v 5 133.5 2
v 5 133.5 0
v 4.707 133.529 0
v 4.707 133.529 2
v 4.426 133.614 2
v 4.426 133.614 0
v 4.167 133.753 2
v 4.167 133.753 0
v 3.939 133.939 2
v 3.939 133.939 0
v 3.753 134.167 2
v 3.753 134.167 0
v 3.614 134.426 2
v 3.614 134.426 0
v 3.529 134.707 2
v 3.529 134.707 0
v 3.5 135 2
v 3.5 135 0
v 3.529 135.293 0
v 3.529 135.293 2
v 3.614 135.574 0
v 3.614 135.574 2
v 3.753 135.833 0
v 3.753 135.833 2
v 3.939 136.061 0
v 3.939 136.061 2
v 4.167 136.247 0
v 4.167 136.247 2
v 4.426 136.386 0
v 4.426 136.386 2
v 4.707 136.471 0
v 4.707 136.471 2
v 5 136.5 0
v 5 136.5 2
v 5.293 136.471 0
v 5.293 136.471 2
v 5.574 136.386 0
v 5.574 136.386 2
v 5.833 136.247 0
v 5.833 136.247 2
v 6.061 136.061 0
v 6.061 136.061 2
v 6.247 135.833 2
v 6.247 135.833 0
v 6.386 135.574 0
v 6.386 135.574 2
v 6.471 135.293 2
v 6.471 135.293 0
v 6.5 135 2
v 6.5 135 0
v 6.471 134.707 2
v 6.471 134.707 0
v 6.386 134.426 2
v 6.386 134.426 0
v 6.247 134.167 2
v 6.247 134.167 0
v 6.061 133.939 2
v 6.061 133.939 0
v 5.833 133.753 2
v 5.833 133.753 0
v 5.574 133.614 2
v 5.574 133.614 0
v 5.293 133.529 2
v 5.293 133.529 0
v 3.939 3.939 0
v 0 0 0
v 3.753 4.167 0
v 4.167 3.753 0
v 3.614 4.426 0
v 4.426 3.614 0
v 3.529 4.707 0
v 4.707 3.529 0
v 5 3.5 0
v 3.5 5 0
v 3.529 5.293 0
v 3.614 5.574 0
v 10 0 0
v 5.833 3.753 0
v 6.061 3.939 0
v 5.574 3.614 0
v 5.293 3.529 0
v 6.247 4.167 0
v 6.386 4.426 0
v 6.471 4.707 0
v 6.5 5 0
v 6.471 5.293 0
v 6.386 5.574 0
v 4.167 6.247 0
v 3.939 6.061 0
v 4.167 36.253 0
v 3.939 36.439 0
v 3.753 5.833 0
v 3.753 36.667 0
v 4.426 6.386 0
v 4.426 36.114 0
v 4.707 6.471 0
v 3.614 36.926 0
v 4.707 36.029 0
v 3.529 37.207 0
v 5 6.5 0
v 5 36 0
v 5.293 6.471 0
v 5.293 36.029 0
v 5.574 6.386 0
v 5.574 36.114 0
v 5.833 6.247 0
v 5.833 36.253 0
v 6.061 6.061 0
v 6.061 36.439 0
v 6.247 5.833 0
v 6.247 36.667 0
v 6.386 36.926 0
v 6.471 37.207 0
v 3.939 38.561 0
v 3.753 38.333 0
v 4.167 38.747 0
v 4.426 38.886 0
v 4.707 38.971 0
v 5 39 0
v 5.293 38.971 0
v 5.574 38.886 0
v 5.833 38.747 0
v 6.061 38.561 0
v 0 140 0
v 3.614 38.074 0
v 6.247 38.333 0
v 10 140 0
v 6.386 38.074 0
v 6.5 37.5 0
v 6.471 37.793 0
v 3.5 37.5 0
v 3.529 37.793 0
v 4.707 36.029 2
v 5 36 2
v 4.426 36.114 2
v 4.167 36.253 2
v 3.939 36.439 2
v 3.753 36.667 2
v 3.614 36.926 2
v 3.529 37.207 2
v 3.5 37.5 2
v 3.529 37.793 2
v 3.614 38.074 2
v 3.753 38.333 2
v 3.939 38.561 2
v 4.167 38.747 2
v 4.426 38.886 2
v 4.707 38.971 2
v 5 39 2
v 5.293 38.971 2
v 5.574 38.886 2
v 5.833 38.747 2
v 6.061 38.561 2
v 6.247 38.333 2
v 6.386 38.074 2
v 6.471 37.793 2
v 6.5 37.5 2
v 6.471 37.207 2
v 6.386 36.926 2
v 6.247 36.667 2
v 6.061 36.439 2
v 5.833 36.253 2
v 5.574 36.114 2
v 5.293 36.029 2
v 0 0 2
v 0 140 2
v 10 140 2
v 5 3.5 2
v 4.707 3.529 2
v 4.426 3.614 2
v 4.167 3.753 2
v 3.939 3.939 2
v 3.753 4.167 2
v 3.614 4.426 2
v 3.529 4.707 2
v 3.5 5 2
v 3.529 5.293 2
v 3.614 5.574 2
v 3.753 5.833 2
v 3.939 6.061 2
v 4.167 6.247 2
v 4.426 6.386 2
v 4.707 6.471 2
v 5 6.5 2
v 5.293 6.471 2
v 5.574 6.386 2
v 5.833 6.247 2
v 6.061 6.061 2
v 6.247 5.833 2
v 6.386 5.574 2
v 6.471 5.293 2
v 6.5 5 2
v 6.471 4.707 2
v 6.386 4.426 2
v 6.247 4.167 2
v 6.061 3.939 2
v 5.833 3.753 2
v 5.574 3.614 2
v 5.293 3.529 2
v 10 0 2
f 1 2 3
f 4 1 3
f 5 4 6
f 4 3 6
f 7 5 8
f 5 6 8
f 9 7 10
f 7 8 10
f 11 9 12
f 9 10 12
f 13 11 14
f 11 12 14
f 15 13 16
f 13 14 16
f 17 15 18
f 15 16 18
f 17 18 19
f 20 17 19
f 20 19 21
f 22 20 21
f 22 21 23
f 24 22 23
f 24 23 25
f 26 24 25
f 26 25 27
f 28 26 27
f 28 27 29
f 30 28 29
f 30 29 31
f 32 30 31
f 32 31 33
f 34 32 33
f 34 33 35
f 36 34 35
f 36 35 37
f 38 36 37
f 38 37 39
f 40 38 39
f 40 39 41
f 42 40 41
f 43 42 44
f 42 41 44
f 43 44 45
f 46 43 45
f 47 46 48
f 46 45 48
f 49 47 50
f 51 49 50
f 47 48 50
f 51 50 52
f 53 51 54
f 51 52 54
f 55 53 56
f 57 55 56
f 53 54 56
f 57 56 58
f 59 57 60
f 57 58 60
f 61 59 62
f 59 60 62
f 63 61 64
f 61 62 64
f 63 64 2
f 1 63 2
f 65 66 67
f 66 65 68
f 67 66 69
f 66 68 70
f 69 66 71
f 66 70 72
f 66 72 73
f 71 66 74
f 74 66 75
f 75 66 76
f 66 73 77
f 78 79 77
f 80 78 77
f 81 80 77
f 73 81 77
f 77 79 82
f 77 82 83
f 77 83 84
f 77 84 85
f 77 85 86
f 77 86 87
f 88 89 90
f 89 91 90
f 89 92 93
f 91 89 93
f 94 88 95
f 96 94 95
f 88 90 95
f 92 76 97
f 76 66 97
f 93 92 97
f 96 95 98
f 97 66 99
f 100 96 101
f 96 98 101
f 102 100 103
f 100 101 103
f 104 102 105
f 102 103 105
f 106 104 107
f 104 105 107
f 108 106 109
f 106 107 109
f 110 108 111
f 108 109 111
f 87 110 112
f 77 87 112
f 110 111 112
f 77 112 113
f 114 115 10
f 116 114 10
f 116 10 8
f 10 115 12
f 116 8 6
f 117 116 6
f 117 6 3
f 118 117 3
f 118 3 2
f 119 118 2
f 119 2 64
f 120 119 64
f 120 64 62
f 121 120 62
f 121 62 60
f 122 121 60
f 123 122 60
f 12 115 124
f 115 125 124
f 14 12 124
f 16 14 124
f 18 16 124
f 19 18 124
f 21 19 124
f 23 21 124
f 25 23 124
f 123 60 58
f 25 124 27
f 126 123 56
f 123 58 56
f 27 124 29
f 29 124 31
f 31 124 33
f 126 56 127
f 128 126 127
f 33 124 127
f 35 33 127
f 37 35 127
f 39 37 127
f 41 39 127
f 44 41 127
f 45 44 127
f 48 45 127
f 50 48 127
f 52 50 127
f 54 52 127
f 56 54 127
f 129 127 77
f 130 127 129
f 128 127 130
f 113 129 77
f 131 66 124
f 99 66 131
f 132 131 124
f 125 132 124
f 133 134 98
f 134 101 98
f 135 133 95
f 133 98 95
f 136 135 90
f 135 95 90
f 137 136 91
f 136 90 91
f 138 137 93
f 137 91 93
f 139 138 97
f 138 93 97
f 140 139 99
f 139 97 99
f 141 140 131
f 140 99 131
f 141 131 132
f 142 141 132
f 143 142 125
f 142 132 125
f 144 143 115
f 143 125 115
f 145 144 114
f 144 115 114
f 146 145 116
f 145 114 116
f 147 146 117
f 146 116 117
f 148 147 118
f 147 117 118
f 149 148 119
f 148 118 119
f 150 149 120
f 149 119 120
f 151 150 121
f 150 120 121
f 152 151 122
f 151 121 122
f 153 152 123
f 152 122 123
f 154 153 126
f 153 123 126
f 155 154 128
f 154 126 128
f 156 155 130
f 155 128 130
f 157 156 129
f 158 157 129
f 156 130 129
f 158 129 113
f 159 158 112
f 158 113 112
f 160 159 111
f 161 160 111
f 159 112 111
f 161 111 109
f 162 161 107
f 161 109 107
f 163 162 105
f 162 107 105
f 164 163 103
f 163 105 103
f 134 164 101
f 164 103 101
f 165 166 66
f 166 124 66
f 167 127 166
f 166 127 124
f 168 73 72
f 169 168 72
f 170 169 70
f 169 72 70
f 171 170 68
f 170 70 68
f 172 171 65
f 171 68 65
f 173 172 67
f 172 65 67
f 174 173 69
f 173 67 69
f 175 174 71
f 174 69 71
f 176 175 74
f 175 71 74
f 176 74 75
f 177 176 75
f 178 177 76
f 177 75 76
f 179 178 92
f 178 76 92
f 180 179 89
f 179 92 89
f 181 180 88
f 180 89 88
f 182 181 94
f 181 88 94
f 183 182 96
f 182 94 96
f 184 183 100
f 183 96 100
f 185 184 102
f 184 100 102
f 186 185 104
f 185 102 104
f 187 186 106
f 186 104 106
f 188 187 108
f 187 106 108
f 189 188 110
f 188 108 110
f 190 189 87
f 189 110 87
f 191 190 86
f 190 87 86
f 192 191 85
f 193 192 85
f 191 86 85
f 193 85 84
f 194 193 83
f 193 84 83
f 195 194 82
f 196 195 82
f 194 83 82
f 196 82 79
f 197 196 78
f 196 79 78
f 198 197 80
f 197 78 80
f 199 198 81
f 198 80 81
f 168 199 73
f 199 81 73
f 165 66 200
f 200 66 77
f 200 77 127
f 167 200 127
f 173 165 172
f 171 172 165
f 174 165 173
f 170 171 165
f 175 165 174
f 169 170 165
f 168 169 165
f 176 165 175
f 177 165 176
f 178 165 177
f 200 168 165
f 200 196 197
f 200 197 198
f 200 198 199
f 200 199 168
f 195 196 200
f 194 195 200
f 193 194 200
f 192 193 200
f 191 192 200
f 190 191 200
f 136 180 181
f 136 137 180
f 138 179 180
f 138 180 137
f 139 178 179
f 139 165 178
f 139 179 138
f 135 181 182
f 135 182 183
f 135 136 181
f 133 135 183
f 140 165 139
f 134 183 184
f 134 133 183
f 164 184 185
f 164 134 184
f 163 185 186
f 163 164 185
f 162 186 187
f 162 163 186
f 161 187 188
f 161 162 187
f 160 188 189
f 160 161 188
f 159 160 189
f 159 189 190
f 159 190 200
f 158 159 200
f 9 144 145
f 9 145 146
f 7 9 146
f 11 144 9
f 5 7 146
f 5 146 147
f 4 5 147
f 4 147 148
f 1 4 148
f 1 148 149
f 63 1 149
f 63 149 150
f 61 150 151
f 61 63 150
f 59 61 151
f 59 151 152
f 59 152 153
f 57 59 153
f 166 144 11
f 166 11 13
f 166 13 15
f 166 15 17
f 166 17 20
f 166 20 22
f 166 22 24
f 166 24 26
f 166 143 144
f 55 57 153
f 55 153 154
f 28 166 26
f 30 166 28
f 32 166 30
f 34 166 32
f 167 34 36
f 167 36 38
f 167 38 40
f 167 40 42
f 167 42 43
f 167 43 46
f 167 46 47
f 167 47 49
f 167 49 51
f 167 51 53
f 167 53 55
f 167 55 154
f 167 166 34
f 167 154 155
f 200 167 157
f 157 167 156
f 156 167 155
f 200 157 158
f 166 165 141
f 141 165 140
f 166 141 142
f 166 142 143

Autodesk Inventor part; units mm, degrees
ref_plane "YZ Plane" through (0, 0, 0) normal (1, 0, 0) x (0, 1, 0)
ref_plane "XZ Plane" through (0, 0, 0) normal (0, 1, 0) x (-1, 0, 0)
ref_plane "XY Plane" through (0, 0, 0) normal (0, 0, 1) x (1, 0, 0)
sketch "スケッチ1" plane through (0, 0, 0) normal (0, 0, 1) x (1, 0, 0)
  line L0 (0, 0) -> (10, 0)
  line L1 (10, 0) -> (10, 140)
  line L2 (10, 140) -> (0, 140)
  line L3 (0, 140) -> (0, 0)
  dimension "d0" = 10
  dimension "d1" = 140
extrude "押し出し1" add sketch "スケッチ1" along normal blind 2
sketch "スケッチ2" plane through (0, 0, 2) normal (0, 0, 1) x (1, 0, 0)
  line L0 (10, 0) -> (10, 140) projected
  line L1 (0, 0) -> (10, 0) projected
  line L2 (10, 140) -> (0, 140) projected
  point P0 (5, 5)
  point P1 (5, 135)
  dimension "d4" = 5
  dimension "d5" = 5
  dimension "d6" = 5
  dimension "d7" = 5
hole "穴1" at (5, 5, 2) at (5, 135, 2) direction (0, 0, -1) diameter 3 end through all
sketch "スケッチ3" plane through (0, 0, 2) normal (0, 0, 1) x (1, 0, 0)
  circle A0 centre (5, 5) radius 1.5 projected
  point P0 (0, 0)
  point P1 (5, 37.5)
  dimension "d15" = 32.5
hole "穴2" at (5, 37.5, 2) direction (0, 0, -1) diameter 3 end through all
properties part number "レール接続"
